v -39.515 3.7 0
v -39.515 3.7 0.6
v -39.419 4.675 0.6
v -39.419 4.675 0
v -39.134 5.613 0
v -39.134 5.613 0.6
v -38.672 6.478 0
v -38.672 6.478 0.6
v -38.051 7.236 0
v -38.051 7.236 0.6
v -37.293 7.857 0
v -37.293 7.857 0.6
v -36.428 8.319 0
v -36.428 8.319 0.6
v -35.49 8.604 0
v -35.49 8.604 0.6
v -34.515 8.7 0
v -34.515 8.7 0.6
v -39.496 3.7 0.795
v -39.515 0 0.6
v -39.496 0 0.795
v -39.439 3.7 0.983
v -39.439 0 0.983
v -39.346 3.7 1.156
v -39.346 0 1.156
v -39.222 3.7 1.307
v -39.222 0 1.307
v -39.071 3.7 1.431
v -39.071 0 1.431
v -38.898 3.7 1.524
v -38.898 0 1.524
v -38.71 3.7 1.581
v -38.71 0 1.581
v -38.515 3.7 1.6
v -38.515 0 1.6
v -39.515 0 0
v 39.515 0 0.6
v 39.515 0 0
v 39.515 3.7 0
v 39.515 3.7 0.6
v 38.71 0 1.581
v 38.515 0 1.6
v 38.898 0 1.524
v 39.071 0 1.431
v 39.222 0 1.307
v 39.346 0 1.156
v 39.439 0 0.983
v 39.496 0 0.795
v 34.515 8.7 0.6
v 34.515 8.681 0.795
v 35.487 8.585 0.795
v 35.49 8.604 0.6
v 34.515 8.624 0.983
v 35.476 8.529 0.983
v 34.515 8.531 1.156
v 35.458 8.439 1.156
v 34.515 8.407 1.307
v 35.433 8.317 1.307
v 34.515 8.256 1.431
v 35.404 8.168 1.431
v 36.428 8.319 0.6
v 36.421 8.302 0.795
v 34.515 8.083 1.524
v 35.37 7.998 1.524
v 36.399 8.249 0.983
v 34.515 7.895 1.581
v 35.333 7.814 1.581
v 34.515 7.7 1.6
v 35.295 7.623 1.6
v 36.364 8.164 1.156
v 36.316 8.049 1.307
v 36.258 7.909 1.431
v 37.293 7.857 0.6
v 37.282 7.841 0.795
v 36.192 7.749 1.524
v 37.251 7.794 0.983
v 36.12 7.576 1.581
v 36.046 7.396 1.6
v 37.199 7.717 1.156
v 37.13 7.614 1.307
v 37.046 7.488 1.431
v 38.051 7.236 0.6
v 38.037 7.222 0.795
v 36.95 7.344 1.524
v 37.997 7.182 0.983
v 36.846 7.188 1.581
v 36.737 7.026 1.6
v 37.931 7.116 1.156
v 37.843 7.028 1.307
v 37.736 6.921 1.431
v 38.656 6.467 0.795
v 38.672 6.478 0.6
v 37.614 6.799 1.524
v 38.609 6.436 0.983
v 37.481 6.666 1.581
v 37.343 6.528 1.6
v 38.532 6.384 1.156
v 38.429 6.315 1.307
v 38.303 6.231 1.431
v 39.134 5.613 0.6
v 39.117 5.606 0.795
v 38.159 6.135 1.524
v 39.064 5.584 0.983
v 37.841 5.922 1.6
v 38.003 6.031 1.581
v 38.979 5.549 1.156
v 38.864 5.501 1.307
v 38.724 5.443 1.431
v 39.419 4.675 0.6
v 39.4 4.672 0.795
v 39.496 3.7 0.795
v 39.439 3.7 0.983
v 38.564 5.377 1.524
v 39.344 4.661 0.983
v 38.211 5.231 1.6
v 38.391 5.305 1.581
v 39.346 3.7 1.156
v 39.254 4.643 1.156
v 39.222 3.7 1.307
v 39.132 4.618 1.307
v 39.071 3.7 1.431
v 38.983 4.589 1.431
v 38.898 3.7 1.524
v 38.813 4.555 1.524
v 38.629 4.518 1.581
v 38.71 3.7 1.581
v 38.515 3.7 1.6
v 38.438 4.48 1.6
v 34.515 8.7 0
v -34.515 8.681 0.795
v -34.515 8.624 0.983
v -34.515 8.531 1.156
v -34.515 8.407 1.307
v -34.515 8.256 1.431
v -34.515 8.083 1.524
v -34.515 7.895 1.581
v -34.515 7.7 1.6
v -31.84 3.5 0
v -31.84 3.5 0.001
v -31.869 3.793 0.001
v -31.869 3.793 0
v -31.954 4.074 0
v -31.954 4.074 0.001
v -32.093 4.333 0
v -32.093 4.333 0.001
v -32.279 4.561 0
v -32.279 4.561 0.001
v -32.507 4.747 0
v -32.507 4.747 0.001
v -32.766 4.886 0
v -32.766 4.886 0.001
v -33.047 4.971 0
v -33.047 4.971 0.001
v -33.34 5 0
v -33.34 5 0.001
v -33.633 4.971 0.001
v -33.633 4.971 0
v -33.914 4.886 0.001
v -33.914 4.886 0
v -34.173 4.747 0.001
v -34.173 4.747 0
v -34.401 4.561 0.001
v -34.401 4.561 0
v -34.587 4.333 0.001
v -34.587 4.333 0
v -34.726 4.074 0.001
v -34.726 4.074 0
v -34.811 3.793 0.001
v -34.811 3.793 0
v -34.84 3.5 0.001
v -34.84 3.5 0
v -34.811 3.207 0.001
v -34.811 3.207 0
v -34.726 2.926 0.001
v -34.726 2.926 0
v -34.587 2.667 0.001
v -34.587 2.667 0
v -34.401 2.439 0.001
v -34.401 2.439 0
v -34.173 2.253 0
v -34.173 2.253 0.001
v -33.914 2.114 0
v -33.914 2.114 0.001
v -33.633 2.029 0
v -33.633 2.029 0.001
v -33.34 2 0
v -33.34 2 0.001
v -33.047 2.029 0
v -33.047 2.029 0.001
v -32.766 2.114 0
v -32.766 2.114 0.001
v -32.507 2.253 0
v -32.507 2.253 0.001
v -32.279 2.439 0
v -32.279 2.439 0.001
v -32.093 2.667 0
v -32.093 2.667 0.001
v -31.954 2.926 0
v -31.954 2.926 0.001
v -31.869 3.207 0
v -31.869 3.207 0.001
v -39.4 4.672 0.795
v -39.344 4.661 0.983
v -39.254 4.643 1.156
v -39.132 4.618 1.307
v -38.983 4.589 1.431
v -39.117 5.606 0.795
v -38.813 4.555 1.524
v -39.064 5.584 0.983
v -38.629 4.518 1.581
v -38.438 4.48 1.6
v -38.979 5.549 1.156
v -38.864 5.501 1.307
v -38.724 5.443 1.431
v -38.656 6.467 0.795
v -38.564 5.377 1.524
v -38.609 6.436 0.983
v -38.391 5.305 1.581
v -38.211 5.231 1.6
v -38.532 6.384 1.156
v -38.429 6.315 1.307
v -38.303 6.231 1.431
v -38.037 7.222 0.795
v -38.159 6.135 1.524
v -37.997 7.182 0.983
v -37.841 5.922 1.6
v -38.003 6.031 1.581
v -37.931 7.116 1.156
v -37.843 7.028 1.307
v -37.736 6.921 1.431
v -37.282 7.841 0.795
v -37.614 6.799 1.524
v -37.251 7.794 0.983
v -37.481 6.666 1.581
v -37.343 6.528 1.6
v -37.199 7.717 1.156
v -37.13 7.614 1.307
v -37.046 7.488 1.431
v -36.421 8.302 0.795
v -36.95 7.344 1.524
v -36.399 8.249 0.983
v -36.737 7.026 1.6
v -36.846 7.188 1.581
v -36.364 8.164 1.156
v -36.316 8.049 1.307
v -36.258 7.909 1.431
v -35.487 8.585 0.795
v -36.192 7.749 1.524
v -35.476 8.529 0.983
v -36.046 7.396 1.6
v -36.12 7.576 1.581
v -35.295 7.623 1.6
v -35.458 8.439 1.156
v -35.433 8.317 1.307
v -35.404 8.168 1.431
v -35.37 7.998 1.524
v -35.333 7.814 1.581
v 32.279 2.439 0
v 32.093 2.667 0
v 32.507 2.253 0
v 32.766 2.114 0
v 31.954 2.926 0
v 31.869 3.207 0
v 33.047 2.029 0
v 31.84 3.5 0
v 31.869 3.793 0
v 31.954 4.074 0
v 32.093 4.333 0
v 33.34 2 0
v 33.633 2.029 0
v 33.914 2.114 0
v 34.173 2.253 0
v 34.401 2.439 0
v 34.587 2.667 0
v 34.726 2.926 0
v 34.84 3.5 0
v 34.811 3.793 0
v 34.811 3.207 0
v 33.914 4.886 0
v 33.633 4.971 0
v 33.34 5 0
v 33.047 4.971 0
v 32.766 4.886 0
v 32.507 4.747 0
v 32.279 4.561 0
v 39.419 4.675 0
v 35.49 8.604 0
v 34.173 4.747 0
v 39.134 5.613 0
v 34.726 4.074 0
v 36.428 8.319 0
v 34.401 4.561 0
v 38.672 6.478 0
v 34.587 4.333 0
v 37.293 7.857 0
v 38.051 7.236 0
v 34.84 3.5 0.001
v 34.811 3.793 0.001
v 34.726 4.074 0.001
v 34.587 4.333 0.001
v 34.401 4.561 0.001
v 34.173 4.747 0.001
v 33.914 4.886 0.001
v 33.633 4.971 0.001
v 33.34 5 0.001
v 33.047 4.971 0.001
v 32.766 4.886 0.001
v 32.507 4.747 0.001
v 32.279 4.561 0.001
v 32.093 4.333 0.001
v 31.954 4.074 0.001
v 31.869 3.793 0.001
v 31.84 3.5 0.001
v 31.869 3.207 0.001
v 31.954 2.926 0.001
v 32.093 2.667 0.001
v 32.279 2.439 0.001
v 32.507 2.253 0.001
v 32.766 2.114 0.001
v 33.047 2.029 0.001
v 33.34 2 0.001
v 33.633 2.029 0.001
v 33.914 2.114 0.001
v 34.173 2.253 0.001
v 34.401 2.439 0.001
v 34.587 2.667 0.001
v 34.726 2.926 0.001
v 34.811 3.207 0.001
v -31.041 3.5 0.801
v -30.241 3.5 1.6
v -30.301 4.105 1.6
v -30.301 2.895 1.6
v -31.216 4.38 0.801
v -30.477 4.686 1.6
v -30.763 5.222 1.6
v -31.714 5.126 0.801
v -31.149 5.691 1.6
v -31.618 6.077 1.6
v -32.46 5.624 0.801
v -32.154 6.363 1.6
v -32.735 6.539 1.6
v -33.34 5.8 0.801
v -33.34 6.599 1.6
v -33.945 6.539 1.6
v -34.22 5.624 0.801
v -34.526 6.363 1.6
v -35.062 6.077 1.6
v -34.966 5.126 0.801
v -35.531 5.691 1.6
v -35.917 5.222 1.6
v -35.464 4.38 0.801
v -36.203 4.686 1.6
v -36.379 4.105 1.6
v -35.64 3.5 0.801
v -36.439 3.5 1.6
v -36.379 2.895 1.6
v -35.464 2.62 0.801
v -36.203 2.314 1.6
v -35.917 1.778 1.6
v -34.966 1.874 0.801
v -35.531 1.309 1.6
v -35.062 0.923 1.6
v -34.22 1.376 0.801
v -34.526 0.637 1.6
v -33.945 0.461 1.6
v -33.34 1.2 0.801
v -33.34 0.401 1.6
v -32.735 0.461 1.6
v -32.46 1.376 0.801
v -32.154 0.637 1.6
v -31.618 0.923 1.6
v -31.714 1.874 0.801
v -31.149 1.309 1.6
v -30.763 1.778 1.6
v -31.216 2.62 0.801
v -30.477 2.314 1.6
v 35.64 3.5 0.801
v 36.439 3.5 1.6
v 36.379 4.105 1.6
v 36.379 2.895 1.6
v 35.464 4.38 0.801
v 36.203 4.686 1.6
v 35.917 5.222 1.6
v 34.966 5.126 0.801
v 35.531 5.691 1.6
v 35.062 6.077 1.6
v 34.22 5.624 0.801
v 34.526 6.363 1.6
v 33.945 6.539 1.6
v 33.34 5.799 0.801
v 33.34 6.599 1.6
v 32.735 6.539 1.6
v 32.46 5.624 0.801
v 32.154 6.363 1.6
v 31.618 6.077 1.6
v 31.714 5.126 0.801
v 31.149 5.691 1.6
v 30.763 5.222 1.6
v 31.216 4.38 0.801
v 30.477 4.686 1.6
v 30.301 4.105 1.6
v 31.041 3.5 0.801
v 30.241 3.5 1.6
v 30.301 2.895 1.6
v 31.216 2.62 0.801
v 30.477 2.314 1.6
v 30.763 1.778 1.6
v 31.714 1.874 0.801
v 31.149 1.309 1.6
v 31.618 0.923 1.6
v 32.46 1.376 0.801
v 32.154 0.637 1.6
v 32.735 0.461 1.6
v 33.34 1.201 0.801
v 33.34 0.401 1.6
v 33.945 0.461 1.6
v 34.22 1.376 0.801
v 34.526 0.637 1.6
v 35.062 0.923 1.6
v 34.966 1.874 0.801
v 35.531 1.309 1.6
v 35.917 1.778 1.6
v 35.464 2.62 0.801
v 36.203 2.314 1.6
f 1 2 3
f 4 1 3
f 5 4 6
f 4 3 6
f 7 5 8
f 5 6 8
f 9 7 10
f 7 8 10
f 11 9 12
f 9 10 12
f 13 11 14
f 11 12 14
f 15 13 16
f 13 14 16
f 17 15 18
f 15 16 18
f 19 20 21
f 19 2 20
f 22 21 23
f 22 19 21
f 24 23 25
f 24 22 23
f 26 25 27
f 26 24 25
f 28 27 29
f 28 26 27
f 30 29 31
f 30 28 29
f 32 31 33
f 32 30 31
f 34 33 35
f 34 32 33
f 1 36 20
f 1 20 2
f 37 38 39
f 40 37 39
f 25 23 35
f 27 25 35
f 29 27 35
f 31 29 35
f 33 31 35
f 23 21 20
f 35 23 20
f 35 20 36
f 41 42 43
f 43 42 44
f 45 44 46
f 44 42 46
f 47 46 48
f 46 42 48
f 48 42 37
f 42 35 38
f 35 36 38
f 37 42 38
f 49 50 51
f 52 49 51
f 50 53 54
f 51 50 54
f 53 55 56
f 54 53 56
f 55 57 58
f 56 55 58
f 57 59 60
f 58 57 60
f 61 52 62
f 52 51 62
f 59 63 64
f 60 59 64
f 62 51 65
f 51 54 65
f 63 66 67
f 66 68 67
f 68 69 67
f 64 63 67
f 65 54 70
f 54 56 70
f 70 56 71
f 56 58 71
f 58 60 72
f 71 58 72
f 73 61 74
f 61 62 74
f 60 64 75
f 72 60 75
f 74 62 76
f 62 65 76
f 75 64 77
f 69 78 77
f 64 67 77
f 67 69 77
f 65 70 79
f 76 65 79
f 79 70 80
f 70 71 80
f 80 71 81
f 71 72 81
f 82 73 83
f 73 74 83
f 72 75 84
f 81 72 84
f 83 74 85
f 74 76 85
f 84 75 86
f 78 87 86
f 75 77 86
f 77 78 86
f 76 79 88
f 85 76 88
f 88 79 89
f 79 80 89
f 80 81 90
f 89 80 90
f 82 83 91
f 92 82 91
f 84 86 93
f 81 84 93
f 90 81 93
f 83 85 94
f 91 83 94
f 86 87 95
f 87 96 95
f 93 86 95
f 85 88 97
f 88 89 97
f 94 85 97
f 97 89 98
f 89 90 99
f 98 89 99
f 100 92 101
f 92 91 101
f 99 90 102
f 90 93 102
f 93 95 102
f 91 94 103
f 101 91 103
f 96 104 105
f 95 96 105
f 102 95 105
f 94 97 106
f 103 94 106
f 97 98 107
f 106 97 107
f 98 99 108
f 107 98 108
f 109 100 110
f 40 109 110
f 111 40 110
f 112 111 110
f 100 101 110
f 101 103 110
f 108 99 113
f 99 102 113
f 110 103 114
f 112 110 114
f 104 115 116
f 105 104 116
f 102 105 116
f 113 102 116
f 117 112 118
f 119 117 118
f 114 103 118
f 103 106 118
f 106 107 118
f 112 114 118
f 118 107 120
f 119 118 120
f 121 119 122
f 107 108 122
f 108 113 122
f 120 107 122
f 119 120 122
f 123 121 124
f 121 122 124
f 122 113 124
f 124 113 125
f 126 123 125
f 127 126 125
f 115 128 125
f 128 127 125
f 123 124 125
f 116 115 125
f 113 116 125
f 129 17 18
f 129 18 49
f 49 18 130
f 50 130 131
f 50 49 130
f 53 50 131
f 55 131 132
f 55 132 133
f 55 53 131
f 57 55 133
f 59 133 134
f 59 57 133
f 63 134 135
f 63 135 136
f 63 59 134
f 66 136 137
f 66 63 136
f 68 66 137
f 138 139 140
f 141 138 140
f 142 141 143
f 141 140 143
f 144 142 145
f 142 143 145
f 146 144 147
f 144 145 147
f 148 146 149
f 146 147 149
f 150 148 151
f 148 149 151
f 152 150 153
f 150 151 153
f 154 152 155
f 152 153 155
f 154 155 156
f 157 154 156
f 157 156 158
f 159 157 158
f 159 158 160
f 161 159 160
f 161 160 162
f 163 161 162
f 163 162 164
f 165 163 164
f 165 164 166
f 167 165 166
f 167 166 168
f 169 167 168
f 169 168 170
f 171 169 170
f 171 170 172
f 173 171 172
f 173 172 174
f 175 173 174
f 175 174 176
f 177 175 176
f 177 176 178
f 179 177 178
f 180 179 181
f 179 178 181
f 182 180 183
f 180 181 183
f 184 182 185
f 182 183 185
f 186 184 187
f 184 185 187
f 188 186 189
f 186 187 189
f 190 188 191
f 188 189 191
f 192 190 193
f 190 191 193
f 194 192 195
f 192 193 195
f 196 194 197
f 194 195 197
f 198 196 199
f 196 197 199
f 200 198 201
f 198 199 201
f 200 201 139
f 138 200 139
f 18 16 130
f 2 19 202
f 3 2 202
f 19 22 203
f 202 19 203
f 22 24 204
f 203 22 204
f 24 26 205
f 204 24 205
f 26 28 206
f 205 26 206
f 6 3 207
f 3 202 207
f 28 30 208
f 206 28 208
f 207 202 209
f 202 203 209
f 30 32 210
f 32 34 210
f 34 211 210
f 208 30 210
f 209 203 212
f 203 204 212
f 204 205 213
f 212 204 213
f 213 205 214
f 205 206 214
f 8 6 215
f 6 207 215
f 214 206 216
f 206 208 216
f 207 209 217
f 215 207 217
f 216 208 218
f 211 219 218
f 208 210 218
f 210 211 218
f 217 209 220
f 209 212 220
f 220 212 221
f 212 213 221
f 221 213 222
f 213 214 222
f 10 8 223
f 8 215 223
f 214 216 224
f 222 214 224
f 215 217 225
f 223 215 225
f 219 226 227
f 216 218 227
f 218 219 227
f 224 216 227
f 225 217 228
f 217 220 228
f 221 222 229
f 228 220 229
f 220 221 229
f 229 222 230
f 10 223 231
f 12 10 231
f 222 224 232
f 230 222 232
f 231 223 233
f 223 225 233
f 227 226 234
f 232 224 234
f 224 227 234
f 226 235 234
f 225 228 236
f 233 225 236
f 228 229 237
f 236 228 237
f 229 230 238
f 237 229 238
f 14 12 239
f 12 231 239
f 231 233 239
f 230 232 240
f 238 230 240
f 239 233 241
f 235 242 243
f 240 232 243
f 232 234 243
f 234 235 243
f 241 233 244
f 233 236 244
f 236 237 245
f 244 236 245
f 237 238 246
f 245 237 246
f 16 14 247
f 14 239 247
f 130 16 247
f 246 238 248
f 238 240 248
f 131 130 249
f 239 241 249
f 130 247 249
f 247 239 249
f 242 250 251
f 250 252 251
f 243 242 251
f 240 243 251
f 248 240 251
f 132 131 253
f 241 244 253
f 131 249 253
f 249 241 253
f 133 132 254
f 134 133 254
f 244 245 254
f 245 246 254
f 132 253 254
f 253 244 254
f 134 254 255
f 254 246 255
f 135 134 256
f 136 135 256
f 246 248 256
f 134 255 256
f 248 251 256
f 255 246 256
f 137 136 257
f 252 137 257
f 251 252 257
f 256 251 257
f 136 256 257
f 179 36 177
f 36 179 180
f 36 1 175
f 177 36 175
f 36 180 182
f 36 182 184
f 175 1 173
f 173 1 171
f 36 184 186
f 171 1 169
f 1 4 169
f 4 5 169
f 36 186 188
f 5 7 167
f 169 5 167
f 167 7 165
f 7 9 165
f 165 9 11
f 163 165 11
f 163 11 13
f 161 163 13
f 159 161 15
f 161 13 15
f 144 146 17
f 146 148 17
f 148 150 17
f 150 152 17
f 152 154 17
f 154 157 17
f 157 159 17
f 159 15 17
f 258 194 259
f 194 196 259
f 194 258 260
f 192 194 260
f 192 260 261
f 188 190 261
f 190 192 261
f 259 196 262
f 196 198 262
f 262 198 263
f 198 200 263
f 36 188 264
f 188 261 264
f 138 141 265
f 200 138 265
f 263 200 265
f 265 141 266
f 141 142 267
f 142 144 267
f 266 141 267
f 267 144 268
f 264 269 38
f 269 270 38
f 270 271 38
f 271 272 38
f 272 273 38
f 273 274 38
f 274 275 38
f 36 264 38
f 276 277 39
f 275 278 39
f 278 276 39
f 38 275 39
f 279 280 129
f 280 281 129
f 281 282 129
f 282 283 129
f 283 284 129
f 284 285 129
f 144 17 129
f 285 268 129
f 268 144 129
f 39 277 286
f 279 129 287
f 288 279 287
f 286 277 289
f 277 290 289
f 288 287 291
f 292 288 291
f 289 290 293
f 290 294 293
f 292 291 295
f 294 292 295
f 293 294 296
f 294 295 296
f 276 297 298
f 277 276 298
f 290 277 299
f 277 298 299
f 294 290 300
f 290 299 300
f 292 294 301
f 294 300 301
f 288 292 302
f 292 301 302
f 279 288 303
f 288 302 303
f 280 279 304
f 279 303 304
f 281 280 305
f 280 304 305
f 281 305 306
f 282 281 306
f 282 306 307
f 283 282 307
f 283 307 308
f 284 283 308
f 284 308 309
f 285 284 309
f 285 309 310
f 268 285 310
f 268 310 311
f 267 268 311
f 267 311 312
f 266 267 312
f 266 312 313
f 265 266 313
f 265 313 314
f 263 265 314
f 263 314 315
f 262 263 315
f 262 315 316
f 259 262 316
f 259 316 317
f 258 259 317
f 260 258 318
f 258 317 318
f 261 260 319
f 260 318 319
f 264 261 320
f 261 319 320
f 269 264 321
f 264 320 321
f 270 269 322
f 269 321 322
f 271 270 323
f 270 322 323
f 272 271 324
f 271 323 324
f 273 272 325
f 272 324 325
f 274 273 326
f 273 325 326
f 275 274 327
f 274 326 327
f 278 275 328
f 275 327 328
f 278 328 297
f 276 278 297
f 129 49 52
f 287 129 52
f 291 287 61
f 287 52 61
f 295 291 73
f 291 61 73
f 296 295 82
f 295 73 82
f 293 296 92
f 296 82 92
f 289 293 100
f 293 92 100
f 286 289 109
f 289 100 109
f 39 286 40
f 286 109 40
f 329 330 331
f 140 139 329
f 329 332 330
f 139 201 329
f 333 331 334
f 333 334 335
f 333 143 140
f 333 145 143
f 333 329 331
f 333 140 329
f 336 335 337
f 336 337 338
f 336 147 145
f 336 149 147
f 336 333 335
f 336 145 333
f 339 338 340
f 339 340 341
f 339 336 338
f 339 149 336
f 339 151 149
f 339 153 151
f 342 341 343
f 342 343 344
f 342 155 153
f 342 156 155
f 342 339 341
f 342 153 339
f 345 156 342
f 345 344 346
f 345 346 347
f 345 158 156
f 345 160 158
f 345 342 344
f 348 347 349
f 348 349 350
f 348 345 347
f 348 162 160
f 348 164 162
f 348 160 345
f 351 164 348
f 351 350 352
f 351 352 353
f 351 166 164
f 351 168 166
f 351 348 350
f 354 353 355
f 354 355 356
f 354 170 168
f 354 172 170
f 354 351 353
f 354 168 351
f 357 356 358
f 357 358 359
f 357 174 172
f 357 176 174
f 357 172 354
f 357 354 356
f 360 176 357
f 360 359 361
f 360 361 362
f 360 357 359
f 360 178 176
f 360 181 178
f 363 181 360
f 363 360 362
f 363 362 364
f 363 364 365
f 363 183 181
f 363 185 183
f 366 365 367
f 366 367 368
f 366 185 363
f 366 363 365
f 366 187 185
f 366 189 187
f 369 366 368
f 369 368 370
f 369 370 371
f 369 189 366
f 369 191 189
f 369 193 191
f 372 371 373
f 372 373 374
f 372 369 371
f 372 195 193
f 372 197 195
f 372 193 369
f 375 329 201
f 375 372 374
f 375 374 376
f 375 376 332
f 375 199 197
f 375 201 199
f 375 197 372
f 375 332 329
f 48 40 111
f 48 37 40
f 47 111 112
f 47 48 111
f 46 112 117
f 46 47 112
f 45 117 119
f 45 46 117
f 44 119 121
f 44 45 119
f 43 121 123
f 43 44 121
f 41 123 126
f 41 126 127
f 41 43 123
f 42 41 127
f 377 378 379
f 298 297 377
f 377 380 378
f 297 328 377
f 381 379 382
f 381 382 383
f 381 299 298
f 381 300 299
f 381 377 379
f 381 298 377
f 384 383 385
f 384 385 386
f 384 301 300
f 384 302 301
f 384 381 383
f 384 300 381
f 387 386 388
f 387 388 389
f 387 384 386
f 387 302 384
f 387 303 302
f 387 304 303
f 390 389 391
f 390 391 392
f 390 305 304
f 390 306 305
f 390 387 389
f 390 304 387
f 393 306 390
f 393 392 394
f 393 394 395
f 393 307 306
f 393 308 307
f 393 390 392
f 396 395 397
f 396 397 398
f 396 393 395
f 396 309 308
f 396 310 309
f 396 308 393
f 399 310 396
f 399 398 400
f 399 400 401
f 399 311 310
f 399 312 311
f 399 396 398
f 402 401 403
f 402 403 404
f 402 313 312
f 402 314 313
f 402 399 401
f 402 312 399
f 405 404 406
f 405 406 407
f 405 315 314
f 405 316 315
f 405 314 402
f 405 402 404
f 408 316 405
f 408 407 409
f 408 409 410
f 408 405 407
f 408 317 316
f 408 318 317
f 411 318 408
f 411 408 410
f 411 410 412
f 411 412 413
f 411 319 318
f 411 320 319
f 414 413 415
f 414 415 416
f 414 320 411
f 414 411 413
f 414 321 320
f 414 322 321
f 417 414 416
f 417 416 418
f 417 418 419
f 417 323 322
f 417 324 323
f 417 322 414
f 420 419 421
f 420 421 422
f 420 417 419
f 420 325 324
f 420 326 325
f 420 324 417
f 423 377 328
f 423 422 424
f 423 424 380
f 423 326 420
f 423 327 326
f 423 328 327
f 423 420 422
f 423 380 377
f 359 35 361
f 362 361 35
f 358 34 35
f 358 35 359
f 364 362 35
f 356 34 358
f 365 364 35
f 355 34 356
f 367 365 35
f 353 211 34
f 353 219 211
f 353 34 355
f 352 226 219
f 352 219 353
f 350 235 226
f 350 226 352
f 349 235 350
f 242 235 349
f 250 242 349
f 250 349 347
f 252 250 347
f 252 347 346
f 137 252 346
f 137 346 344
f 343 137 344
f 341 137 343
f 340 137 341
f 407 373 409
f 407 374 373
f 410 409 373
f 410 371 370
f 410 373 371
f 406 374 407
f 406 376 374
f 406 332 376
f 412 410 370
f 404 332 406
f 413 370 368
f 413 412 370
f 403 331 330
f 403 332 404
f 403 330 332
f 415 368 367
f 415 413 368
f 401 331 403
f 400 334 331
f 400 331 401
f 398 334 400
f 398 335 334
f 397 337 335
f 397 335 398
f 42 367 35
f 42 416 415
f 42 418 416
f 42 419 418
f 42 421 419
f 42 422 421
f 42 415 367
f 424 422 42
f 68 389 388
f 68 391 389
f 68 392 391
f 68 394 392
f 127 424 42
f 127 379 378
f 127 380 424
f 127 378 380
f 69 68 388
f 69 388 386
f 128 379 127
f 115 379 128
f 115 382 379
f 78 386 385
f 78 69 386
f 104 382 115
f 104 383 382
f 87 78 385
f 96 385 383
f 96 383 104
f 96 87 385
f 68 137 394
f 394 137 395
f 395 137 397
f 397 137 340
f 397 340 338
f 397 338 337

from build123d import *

# Parameters (mm, degrees)
SKETCH_W     = 79.03
SKETCH_H     = 8.7
PAD_DEPTH    = 1.6
SKETCH001_R  = 1.5
POCKET_DEPTH = 1.601
FILLET_R     = 5
FILLET001_R  = 1
CHAMFER_SIZE = 1.599


with BuildPart() as part:
    # Sketch → Pad (new body)
    with BuildSketch(Plane.XY):
        with Locations((0, 4.35)):
            Rectangle(SKETCH_W, SKETCH_H)
    extrude(amount=PAD_DEPTH)

    # Sketch001 (on Face6 of Pad) → Pocket (cut, through all)
    with BuildSketch(Plane.XY.offset(1.6)):
        with Locations((-33.34, 3.5)):
            Circle(SKETCH001_R)
        with Locations((33.34, 3.5)):
            Circle(SKETCH001_R)
    extrude(amount=-POCKET_DEPTH, mode=Mode.SUBTRACT)

    # Fillet
    fillet_edges = [part.edges().sort_by_distance(p)[0] for p in [
        (39.515, 8.7, 0.8),
        (-39.515, 8.7, 0.8),
    ]]
    fillet(fillet_edges, radius=FILLET_R)

    # Fillet001
    fillet001_edges = [part.edges().sort_by_distance(p)[0] for p in [
        (-38.050534, 7.235534, 1.6),
    ]]
    fillet(fillet001_edges, radius=FILLET001_R)

    # Chamfer
    chamfer_edges = [part.edges().sort_by_distance(p)[0] for p in [
        (31.84, 3.5, 1.6),
        (-34.84, 3.5, 1.6),
    ]]
    chamfer(chamfer_edges, length=CHAMFER_SIZE)


solid = part.part
